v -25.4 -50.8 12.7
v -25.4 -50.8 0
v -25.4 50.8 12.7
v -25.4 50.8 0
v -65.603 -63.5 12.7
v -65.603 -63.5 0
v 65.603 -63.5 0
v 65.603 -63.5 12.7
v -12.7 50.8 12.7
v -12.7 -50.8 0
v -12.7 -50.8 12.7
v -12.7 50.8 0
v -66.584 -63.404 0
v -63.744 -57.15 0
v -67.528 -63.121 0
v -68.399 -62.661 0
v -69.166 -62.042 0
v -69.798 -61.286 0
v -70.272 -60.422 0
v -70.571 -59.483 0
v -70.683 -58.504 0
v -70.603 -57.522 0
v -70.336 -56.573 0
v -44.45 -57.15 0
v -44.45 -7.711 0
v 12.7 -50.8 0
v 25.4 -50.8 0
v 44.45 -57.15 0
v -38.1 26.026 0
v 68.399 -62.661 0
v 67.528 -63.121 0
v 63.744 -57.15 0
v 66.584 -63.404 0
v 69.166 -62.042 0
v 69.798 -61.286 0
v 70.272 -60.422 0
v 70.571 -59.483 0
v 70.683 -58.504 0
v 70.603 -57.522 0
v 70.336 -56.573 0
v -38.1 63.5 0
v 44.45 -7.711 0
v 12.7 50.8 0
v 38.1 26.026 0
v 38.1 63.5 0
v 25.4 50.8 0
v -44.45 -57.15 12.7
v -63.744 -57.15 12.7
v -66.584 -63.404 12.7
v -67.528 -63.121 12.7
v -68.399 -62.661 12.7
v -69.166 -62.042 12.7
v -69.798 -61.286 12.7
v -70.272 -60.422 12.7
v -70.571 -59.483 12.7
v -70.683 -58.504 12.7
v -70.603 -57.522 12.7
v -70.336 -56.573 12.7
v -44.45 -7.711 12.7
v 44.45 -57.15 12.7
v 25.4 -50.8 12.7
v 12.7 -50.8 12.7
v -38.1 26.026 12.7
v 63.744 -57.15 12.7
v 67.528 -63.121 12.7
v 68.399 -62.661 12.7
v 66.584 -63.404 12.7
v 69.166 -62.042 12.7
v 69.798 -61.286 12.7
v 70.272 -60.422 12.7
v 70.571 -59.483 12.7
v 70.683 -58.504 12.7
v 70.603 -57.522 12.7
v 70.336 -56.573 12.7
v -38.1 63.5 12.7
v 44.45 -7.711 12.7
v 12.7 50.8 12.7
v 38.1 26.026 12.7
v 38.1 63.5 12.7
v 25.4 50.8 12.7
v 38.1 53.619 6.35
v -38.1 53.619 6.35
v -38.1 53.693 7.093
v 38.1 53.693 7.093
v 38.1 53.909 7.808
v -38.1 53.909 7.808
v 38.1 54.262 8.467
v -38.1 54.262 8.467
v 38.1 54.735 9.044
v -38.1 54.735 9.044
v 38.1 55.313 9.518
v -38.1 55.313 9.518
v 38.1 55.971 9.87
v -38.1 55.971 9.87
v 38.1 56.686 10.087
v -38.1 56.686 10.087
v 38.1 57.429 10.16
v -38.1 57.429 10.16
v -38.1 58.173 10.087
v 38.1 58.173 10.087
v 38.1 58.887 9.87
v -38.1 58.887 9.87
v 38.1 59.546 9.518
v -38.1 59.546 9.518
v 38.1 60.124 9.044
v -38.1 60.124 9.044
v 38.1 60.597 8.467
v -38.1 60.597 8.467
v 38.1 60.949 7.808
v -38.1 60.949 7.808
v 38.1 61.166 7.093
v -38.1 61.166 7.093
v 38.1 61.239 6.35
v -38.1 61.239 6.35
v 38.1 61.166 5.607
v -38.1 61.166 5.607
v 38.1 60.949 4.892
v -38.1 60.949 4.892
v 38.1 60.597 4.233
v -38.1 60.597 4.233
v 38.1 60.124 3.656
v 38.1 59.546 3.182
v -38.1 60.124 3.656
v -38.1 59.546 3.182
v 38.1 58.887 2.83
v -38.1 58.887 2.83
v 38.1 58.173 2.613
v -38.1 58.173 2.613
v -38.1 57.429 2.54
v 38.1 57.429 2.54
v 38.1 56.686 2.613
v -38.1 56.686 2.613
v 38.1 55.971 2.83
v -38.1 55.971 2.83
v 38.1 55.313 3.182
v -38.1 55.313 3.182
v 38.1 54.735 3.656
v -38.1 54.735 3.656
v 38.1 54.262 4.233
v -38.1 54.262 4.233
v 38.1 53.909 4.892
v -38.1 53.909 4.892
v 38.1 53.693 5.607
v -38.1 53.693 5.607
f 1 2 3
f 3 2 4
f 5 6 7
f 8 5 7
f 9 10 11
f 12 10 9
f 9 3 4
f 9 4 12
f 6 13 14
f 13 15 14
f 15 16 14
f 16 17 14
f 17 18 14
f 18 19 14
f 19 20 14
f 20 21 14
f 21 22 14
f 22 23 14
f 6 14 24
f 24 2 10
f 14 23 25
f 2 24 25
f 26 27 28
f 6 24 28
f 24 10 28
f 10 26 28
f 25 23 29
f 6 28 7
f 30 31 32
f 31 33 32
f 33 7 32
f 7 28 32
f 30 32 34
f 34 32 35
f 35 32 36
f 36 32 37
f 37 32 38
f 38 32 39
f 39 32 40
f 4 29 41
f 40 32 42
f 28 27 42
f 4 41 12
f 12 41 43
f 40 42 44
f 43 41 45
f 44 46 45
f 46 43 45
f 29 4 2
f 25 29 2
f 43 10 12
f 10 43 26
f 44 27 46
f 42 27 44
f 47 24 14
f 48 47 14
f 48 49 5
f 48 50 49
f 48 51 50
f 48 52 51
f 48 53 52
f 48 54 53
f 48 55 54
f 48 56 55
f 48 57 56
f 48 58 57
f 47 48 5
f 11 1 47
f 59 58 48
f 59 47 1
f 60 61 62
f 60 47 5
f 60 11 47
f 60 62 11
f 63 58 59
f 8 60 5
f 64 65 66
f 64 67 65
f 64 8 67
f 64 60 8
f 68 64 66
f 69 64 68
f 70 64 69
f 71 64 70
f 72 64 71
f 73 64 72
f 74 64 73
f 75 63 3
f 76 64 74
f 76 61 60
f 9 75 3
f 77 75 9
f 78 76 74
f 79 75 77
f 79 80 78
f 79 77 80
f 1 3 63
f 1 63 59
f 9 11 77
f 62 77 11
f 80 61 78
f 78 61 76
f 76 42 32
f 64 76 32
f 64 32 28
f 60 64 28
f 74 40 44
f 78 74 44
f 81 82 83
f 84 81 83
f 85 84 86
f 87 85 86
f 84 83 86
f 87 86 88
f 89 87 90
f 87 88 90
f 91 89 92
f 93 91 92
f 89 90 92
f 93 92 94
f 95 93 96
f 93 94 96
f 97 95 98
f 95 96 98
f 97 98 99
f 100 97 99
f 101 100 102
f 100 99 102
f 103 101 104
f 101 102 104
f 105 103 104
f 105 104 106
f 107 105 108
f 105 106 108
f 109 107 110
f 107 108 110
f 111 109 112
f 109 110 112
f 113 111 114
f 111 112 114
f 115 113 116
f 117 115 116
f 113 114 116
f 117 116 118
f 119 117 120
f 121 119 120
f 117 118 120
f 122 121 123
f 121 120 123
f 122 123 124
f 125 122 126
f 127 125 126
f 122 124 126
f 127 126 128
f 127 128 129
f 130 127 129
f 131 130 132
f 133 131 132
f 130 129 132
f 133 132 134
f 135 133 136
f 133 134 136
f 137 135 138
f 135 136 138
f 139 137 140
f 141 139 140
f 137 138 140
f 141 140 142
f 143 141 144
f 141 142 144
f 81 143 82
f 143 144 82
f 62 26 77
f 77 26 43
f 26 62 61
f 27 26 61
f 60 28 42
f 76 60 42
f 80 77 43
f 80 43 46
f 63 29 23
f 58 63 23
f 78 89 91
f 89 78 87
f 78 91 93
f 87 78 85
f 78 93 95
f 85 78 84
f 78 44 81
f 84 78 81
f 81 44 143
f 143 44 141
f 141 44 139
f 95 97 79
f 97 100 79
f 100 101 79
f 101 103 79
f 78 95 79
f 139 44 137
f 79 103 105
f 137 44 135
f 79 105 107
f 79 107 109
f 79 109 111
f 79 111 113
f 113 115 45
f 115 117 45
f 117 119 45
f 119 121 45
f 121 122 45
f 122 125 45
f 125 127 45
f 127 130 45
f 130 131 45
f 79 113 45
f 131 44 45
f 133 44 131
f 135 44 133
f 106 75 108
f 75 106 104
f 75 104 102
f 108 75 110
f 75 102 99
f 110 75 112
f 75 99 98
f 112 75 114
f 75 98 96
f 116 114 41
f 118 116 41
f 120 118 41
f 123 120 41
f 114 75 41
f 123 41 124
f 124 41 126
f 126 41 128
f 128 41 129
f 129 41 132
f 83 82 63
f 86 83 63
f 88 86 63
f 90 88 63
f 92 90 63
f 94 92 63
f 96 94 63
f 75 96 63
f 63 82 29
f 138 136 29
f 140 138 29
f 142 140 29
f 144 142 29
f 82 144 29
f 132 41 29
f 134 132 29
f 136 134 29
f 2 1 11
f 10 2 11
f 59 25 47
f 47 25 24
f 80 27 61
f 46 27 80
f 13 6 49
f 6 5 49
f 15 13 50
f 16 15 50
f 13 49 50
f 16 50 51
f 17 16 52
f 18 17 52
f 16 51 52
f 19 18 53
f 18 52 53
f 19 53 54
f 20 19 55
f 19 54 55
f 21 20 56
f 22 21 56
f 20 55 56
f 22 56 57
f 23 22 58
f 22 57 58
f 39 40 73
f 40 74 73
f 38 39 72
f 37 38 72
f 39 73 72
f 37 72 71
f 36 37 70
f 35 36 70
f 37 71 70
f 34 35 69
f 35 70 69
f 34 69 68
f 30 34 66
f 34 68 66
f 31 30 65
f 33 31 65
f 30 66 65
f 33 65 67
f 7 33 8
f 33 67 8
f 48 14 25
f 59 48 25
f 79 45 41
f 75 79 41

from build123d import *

# Parameters (mm, degrees)
F0_W     = 12.7
F0_H     = 101.6
F1_DEPTH = 12.7
F2_R     = 5.08
F3_R     = 3.81
F4_DEPTH = 76.2


with BuildPart() as f1:
    # F0 (on Top) → F1 (new body)
    with BuildSketch(Plane.XY):
        Polygon((-38.1, -63.5), (38.1, -63.5), (73.039025, -63.5), (38.1, 26.026342), (38.1, 63.5), (-38.1, 63.5), (-38.1, 26.026342), (-73.039025, -63.5), align=None)
        Polygon((-63.744396, -57.149999), (-44.450001, -7.710822), (-44.450001, -57.149999), align=None, mode=Mode.SUBTRACT)
        Polygon((44.45, -57.15), (44.45, -7.710819), (63.744397, -57.15), align=None, mode=Mode.SUBTRACT)
        with Locations((-19.05, 0)):
            Rectangle(F0_W, F0_H, mode=Mode.SUBTRACT)
        with Locations((19.05, 0)):
            Rectangle(F0_W, F0_H, mode=Mode.SUBTRACT)
    extrude(amount=F1_DEPTH)

    # F2
    f2_edges = [f1.edges().sort_by_distance(p)[0] for p in [
        (73.039025, -63.5, 6.35),
        (-73.039025, -63.5, 6.35),
    ]]
    fillet(f2_edges, radius=F2_R)

    # F3 (on face) → F4 (cut)
    with BuildSketch(Plane(origin=(-38.1, 0, 0), x_dir=(0, -1, 0), z_dir=(-1, 0, 0))):
        with Locations((-57.429425, 6.35)):
            Circle(F3_R)
    extrude(amount=-F4_DEPTH, mode=Mode.SUBTRACT)


solid = f1.part
